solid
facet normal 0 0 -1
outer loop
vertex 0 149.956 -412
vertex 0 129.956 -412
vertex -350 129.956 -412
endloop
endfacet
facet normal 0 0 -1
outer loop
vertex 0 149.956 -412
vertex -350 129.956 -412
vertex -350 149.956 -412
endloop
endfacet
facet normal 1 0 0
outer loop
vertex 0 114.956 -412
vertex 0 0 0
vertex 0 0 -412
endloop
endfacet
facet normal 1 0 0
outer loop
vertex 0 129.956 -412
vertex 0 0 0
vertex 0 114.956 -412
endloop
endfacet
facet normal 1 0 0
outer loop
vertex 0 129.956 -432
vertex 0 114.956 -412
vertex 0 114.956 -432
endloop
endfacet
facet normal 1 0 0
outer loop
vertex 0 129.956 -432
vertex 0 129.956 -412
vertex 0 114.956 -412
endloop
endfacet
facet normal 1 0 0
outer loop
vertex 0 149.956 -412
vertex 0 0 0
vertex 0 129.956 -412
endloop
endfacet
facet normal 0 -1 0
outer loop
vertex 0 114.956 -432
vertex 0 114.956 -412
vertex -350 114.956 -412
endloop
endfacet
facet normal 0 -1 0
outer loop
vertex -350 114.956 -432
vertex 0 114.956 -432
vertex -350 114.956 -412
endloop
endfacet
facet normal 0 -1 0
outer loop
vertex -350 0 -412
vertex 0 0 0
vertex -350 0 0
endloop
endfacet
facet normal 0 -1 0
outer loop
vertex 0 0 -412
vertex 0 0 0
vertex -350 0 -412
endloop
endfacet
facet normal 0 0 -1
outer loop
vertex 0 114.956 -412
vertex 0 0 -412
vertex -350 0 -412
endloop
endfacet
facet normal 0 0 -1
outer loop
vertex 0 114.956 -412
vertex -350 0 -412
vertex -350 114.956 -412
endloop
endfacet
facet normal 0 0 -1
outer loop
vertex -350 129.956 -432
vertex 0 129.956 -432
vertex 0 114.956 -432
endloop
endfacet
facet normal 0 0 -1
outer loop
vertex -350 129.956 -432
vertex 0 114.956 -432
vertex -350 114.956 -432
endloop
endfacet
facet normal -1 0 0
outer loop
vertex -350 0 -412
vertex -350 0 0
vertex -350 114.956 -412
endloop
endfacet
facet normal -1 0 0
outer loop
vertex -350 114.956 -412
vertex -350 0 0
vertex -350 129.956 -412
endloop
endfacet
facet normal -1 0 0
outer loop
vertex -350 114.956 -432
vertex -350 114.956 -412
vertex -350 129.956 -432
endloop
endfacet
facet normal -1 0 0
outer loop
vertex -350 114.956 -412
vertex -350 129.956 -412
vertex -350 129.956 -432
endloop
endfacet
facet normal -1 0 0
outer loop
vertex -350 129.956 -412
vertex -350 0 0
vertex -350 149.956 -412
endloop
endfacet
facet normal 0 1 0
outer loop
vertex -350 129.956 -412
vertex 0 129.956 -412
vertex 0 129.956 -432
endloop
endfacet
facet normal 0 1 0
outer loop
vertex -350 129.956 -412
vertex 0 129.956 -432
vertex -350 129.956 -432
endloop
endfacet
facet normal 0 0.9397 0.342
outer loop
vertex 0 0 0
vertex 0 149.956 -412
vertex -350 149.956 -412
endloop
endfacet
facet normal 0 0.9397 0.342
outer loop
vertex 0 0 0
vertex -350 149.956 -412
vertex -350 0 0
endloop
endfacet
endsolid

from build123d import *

# Parameters (mm, degrees)
BOSS_EXTRUDE1_DEPTH = 350
SKETCH3_W           = 350
SKETCH3_H           = 15
BOSS_EXTRUDE2_DEPTH = 20


with BuildPart() as part:
    # Sketch1 → Boss-Extrude1 (new body)
    with BuildSketch(Plane(origin=(0, 0, 0), x_dir=(0, 0, -1), z_dir=(1, 0, 0))):
        Polygon((0, 0), (412, 0), (412, 149.955736518), align=None)
    extrude(amount=-BOSS_EXTRUDE1_DEPTH)

    # Sketch3 → Boss-Extrude2 (add)
    with BuildSketch(Plane(origin=(0, 0, -412), x_dir=(-1, 0, 0), z_dir=(0, 0, -1))):
        with Locations((175, 122.455736518)):
            Rectangle(SKETCH3_W, SKETCH3_H)
    extrude(amount=BOSS_EXTRUDE2_DEPTH)


solid = part.part
